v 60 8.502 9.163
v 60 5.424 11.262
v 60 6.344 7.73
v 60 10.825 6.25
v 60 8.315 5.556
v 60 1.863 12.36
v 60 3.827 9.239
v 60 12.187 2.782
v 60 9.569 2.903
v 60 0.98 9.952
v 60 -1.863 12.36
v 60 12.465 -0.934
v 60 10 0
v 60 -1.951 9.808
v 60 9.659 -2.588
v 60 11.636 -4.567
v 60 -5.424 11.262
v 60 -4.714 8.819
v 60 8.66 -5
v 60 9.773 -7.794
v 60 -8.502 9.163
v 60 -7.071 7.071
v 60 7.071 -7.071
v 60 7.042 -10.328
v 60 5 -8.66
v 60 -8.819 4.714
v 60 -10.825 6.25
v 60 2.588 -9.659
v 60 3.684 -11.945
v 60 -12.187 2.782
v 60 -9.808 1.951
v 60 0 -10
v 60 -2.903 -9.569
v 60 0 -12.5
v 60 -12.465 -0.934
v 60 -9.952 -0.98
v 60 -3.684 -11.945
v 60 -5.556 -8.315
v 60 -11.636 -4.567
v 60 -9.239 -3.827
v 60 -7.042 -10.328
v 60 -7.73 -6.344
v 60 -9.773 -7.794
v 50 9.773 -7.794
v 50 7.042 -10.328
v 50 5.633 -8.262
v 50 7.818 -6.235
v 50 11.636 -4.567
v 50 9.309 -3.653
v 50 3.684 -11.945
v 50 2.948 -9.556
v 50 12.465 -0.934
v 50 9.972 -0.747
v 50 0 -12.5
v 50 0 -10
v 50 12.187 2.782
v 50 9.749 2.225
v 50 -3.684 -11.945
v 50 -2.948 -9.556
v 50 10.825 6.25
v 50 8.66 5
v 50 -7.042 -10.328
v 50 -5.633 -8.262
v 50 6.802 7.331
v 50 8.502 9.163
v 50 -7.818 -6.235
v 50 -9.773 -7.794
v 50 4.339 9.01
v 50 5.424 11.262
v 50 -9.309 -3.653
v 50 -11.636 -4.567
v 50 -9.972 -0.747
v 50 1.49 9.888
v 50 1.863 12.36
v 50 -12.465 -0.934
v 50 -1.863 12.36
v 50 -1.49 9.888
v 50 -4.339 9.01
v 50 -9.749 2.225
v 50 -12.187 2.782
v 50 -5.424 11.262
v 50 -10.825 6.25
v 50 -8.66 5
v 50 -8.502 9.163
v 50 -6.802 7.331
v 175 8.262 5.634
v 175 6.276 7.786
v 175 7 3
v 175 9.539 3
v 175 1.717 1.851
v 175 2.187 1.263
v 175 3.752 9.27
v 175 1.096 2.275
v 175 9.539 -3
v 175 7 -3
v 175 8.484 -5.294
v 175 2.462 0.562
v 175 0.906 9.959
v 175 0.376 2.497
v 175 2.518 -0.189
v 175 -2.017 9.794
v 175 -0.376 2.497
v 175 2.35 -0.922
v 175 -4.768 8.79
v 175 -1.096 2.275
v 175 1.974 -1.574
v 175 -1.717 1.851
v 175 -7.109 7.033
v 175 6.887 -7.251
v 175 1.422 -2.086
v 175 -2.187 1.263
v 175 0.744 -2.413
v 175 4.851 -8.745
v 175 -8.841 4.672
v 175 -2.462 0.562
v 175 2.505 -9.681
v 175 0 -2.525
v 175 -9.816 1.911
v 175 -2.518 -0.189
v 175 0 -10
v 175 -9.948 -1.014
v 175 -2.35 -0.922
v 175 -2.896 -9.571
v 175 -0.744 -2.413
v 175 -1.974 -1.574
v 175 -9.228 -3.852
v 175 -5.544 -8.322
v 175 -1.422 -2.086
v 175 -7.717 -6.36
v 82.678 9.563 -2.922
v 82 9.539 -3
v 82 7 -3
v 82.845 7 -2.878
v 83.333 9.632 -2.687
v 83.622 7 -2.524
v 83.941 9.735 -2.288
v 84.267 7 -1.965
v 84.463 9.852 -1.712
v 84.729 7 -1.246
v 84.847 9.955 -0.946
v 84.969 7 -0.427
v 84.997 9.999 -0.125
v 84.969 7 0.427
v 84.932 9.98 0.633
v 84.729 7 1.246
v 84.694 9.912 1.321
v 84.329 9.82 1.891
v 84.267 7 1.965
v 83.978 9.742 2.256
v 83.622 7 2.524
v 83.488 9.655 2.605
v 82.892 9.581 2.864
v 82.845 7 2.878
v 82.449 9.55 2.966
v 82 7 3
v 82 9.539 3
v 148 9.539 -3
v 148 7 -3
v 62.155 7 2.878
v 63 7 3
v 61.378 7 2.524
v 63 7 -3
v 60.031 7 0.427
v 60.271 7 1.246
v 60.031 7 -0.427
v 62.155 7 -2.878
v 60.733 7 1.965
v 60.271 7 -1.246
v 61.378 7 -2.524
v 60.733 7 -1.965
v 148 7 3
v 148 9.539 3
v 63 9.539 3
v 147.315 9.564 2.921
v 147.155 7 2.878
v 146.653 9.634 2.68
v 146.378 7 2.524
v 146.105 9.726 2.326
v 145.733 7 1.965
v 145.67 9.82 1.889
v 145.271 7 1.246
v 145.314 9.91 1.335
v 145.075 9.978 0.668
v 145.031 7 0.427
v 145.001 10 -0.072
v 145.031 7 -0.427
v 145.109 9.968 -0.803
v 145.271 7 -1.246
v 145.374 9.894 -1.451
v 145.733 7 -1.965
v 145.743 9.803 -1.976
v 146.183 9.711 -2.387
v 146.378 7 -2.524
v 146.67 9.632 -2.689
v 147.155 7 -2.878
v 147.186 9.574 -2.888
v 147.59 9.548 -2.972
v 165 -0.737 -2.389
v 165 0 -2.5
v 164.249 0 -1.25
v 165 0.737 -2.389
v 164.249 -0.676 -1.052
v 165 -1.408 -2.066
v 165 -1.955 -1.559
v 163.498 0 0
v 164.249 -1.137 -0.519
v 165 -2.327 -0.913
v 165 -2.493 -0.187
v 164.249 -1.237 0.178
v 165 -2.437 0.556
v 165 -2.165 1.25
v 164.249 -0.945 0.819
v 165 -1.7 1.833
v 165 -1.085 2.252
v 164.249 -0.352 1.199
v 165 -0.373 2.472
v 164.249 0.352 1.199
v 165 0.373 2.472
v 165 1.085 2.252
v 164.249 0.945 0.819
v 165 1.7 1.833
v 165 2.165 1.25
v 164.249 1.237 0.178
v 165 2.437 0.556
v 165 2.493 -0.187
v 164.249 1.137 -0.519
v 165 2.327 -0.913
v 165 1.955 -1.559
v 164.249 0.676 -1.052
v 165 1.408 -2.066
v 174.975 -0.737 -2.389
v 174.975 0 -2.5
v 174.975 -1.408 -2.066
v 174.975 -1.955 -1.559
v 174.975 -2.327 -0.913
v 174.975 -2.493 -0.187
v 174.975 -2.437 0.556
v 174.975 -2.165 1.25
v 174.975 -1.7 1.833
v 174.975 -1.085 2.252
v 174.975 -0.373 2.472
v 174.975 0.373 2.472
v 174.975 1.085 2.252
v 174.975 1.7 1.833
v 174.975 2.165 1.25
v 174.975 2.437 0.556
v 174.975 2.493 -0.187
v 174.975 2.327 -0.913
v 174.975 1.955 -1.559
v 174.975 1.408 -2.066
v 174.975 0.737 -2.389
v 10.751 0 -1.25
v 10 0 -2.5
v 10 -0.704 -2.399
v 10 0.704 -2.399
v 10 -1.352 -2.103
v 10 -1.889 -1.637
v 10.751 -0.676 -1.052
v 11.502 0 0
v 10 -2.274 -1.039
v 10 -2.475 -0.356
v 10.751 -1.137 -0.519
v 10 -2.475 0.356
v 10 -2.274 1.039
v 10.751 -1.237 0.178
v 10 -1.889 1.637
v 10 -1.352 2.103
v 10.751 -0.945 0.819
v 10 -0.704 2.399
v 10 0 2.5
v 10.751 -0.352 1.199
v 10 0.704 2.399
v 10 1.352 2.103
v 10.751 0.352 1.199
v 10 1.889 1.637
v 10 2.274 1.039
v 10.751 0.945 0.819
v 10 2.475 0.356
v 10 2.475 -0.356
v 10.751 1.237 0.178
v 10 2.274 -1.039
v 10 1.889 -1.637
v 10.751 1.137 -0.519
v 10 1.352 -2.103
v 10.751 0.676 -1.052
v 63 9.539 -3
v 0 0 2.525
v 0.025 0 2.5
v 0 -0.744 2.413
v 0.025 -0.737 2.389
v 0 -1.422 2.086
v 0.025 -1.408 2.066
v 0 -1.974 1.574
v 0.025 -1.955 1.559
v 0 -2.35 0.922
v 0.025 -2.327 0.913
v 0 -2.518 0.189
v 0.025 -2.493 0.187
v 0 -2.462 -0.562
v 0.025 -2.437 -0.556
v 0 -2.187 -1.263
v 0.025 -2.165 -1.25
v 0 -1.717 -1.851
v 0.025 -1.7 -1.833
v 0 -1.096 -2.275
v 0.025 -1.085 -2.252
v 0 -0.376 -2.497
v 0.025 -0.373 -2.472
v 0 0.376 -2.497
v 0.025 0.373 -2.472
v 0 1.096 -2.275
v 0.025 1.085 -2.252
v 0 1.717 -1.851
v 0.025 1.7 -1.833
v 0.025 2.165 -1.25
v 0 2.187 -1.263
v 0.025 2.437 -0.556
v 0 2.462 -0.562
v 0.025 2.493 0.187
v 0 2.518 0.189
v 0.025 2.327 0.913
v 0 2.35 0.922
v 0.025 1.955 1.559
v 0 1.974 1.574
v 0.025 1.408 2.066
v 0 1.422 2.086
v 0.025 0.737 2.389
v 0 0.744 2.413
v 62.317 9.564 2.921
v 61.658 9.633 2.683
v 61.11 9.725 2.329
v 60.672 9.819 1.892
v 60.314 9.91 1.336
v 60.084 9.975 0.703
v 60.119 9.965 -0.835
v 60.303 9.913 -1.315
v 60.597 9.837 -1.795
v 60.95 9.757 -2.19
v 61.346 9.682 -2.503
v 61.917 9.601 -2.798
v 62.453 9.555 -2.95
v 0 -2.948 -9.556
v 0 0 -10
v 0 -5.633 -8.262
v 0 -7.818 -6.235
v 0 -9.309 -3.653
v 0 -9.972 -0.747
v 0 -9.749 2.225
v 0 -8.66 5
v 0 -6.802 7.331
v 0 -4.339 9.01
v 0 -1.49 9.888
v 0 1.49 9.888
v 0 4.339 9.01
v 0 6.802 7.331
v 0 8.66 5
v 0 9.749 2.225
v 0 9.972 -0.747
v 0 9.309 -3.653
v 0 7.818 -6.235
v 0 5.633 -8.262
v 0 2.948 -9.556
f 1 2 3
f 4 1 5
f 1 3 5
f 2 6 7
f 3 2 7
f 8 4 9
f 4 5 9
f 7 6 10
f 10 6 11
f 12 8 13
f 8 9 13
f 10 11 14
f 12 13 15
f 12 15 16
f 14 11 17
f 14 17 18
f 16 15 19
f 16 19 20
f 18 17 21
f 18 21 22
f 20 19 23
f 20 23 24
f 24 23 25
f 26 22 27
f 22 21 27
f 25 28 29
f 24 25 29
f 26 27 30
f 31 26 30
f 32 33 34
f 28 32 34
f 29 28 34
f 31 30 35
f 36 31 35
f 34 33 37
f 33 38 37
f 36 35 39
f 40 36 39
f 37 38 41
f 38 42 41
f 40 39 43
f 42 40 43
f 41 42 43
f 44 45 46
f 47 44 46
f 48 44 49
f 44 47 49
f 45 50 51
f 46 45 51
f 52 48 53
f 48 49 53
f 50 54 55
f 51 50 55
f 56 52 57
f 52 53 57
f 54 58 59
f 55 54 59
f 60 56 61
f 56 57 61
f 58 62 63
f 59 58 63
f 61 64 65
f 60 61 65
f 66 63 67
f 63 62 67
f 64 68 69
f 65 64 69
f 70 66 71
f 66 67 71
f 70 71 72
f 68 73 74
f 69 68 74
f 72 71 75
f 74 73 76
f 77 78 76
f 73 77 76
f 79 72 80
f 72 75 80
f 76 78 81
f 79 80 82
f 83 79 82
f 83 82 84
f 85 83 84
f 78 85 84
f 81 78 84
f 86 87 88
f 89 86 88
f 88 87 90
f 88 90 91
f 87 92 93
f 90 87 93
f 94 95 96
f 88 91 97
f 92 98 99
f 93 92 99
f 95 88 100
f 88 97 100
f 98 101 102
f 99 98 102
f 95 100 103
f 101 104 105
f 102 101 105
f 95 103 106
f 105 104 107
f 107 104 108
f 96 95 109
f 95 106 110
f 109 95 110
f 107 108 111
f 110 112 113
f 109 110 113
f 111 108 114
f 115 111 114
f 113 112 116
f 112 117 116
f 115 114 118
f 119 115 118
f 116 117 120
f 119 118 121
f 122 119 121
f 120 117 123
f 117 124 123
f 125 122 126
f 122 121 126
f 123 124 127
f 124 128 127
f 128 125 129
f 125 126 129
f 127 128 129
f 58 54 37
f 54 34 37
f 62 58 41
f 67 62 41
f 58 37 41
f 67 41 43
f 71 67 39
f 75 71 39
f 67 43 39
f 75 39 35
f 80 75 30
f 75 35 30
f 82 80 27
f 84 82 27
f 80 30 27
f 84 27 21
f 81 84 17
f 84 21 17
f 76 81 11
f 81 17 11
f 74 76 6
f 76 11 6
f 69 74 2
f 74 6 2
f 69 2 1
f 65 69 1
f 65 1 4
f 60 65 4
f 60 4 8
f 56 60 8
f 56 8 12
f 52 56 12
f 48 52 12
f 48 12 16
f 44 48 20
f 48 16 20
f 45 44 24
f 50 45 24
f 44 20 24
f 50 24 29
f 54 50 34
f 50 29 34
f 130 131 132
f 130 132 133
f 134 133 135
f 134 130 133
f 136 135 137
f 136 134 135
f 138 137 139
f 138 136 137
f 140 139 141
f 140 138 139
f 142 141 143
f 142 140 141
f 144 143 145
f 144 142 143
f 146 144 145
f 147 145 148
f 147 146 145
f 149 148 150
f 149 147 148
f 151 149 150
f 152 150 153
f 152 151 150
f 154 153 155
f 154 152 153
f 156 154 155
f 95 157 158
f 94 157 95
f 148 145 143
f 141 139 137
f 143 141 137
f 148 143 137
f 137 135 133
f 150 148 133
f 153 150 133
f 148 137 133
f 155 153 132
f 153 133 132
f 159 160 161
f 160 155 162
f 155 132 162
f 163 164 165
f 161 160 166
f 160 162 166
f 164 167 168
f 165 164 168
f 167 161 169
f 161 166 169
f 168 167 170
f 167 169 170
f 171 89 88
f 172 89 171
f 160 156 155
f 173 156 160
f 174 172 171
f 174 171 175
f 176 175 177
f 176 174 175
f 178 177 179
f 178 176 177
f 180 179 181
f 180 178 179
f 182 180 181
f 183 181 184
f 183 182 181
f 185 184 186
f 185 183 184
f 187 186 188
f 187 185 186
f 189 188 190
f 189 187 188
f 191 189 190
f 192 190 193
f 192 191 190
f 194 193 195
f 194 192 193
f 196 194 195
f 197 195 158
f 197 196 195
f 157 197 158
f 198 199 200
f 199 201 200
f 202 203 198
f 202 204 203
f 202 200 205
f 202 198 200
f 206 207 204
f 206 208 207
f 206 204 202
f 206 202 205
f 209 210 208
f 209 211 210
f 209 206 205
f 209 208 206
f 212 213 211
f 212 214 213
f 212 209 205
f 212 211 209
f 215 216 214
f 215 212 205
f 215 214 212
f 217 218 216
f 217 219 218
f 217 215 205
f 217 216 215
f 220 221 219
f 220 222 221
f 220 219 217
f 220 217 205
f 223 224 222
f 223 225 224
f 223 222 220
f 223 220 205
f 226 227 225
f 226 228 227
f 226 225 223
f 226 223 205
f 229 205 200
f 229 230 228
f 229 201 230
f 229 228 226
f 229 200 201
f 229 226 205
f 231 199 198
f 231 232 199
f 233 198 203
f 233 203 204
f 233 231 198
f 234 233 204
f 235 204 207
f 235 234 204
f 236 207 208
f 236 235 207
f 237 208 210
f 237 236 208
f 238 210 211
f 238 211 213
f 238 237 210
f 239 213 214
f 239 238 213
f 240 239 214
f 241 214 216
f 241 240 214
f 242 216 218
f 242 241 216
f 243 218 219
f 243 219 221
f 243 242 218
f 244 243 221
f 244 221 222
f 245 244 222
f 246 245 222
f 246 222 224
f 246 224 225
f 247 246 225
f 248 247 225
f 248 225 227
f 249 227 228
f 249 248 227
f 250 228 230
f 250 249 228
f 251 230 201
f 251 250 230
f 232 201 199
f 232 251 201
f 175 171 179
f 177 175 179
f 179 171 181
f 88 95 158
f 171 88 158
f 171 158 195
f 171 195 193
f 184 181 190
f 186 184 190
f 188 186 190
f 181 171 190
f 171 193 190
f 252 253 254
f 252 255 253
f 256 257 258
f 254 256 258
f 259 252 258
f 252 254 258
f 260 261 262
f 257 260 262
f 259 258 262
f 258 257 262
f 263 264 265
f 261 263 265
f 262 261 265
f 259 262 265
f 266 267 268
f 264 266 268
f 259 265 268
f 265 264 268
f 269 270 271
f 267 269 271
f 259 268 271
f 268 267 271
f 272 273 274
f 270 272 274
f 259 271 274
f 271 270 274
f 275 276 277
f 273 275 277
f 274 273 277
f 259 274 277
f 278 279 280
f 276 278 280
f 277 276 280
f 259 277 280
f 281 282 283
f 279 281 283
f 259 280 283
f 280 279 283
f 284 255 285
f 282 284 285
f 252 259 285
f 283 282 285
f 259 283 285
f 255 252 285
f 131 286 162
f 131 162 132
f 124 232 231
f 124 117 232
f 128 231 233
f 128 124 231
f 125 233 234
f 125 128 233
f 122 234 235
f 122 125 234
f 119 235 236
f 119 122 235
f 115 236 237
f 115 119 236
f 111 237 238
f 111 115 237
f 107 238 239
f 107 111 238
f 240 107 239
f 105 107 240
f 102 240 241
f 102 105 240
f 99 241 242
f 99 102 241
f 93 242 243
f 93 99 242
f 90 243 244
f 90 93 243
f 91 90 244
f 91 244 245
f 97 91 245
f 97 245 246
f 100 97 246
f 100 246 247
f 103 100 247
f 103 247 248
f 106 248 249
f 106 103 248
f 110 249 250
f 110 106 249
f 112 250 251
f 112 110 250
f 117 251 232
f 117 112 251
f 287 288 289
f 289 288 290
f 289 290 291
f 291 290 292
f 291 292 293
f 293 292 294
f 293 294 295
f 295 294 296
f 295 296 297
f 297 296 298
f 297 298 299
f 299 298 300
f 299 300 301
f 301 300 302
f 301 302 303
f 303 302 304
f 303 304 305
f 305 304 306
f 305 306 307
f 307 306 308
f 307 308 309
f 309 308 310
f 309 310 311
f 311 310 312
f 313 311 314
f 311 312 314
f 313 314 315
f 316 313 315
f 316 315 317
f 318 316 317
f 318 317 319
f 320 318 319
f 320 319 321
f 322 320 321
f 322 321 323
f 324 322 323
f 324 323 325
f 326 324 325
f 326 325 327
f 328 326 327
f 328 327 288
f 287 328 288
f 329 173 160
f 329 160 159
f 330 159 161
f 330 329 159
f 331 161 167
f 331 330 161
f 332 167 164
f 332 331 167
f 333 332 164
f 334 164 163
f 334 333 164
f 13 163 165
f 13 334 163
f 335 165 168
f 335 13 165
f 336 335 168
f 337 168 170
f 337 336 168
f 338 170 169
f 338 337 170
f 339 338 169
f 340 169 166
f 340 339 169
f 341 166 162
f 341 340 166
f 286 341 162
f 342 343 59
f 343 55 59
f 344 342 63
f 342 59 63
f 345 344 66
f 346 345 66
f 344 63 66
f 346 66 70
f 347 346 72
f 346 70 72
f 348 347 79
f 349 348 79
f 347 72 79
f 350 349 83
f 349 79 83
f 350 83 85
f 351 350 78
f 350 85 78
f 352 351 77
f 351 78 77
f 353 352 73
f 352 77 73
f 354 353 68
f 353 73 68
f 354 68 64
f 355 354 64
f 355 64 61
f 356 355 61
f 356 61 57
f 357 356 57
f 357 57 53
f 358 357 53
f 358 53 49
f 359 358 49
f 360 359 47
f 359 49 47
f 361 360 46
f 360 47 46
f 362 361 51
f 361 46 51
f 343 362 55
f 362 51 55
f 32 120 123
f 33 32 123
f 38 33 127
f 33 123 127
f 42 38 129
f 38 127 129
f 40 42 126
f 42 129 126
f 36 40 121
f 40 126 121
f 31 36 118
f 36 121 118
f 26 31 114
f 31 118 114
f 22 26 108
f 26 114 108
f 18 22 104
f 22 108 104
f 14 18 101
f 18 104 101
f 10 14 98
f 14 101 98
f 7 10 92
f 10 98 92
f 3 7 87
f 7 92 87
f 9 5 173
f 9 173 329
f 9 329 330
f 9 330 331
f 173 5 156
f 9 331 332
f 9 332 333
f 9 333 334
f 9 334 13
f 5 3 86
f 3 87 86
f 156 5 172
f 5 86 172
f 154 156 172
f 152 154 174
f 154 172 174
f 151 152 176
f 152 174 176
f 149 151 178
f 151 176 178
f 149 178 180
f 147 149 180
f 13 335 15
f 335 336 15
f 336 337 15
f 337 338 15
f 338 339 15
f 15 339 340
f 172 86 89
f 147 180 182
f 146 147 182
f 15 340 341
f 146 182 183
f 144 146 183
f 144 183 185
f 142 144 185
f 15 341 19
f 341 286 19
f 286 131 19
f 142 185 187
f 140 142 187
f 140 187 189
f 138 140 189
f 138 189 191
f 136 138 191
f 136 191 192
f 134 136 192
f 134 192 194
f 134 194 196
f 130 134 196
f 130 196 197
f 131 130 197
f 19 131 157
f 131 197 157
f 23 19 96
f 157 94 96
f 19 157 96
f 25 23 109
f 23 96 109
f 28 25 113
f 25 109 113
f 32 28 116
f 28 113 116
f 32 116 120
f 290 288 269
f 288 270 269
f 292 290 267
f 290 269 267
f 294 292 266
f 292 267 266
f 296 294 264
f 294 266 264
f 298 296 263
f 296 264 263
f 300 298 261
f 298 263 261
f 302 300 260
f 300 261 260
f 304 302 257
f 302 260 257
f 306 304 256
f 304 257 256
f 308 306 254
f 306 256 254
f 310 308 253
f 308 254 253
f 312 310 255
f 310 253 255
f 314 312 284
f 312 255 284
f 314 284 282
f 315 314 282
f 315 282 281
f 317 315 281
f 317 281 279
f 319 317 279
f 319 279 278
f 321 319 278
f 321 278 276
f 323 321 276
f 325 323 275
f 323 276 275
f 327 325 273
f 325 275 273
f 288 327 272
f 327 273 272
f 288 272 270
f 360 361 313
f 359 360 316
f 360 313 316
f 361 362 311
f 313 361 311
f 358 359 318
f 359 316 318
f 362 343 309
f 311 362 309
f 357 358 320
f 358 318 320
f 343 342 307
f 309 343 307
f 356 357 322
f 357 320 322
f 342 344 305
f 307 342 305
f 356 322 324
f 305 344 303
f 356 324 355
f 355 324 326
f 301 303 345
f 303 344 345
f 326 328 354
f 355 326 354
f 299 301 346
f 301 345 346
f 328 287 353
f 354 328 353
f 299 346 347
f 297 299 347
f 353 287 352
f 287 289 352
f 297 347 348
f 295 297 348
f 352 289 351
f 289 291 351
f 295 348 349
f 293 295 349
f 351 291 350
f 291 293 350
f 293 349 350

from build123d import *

# Parameters (mm, degrees)
F_5_0MM_DOWEL_HOLE1_D           = 5
F_5_0MM_DOWEL_HOLE1_DEPTH       = 10
F_5_0MM_DOWEL_HOLE1_CSINK_D     = 5.05
F_5_0MM_DOWEL_HOLE1_CSINK_ANGLE = 90
F_5_0MM_DOWEL_HOLE1_TIP         = 1.502151548
CUT_EXTRUDE1_DEPTH              = 3


with BuildPart() as part:
    # Sketch1 → Revolve1 (revolve)
    with BuildSketch(Plane(origin=(0, 0, 0), x_dir=(1, 0, 0), z_dir=(0, 1, 0))):
        Polygon((0, 0), (0, 10), (50, 10), (50, 12.5), (60, 12.5), (60, 10), (175, 10), (175, 0), align=None)
    revolve(axis=Axis((175, 0, 0), (-1, 0, 0)))

    # Ø5.0mm Dowel Hole1
    with Locations(Plane(origin=(0, 0, 0), x_dir=(0, 0, -1), z_dir=(-1, 0, 0))):
        with Locations((0, 0)):
            CounterSinkHole(F_5_0MM_DOWEL_HOLE1_D / 2, F_5_0MM_DOWEL_HOLE1_CSINK_D / 2, depth=F_5_0MM_DOWEL_HOLE1_DEPTH, counter_sink_angle=F_5_0MM_DOWEL_HOLE1_CSINK_ANGLE)
            with Locations((0, 0, -(F_5_0MM_DOWEL_HOLE1_DEPTH + F_5_0MM_DOWEL_HOLE1_TIP / 2))):  # 118° drill point
                Cone(0, F_5_0MM_DOWEL_HOLE1_D / 2, F_5_0MM_DOWEL_HOLE1_TIP, mode=Mode.SUBTRACT)

    # Sketch9 → Ø5.0mm Dowel Hole2 (revolve, cut)
    with BuildSketch(Plane(origin=(175, 0, 0), x_dir=(0, 0, -1), z_dir=(0, 1, 0))):
        Polygon((0, 0), (0, 11.502151548), (2.5, 10), (2.5, 0.025), (2.525, 0), align=None)
    revolve(axis=Axis((181.35, 0, 0), (-1, 0, 0)), mode=Mode.SUBTRACT)

    # Sketch10 → Cut-Extrude1 (cut)
    with BuildSketch(Plane(origin=(0, 10, 0), x_dir=(1, 0, 0), z_dir=(0, 1, 0))):
        with BuildLine():
            Line((63, 3), (82, 3))
            ThreePointArc((82, 3), (85, 0), (82, -3))
            Line((82, -3), (63, -3))
            ThreePointArc((63, -3), (60, 0), (63, 3))
        make_face()
        with BuildLine():
            Line((175, -3), (148, -3))
            ThreePointArc((148, -3), (145, 0), (148, 3))
            Line((148, 3), (175, 3))
            ThreePointArc((175, 3), (178, 0), (175, -3))
        make_face()
    extrude(amount=-CUT_EXTRUDE1_DEPTH, mode=Mode.SUBTRACT)


solid = part.part
